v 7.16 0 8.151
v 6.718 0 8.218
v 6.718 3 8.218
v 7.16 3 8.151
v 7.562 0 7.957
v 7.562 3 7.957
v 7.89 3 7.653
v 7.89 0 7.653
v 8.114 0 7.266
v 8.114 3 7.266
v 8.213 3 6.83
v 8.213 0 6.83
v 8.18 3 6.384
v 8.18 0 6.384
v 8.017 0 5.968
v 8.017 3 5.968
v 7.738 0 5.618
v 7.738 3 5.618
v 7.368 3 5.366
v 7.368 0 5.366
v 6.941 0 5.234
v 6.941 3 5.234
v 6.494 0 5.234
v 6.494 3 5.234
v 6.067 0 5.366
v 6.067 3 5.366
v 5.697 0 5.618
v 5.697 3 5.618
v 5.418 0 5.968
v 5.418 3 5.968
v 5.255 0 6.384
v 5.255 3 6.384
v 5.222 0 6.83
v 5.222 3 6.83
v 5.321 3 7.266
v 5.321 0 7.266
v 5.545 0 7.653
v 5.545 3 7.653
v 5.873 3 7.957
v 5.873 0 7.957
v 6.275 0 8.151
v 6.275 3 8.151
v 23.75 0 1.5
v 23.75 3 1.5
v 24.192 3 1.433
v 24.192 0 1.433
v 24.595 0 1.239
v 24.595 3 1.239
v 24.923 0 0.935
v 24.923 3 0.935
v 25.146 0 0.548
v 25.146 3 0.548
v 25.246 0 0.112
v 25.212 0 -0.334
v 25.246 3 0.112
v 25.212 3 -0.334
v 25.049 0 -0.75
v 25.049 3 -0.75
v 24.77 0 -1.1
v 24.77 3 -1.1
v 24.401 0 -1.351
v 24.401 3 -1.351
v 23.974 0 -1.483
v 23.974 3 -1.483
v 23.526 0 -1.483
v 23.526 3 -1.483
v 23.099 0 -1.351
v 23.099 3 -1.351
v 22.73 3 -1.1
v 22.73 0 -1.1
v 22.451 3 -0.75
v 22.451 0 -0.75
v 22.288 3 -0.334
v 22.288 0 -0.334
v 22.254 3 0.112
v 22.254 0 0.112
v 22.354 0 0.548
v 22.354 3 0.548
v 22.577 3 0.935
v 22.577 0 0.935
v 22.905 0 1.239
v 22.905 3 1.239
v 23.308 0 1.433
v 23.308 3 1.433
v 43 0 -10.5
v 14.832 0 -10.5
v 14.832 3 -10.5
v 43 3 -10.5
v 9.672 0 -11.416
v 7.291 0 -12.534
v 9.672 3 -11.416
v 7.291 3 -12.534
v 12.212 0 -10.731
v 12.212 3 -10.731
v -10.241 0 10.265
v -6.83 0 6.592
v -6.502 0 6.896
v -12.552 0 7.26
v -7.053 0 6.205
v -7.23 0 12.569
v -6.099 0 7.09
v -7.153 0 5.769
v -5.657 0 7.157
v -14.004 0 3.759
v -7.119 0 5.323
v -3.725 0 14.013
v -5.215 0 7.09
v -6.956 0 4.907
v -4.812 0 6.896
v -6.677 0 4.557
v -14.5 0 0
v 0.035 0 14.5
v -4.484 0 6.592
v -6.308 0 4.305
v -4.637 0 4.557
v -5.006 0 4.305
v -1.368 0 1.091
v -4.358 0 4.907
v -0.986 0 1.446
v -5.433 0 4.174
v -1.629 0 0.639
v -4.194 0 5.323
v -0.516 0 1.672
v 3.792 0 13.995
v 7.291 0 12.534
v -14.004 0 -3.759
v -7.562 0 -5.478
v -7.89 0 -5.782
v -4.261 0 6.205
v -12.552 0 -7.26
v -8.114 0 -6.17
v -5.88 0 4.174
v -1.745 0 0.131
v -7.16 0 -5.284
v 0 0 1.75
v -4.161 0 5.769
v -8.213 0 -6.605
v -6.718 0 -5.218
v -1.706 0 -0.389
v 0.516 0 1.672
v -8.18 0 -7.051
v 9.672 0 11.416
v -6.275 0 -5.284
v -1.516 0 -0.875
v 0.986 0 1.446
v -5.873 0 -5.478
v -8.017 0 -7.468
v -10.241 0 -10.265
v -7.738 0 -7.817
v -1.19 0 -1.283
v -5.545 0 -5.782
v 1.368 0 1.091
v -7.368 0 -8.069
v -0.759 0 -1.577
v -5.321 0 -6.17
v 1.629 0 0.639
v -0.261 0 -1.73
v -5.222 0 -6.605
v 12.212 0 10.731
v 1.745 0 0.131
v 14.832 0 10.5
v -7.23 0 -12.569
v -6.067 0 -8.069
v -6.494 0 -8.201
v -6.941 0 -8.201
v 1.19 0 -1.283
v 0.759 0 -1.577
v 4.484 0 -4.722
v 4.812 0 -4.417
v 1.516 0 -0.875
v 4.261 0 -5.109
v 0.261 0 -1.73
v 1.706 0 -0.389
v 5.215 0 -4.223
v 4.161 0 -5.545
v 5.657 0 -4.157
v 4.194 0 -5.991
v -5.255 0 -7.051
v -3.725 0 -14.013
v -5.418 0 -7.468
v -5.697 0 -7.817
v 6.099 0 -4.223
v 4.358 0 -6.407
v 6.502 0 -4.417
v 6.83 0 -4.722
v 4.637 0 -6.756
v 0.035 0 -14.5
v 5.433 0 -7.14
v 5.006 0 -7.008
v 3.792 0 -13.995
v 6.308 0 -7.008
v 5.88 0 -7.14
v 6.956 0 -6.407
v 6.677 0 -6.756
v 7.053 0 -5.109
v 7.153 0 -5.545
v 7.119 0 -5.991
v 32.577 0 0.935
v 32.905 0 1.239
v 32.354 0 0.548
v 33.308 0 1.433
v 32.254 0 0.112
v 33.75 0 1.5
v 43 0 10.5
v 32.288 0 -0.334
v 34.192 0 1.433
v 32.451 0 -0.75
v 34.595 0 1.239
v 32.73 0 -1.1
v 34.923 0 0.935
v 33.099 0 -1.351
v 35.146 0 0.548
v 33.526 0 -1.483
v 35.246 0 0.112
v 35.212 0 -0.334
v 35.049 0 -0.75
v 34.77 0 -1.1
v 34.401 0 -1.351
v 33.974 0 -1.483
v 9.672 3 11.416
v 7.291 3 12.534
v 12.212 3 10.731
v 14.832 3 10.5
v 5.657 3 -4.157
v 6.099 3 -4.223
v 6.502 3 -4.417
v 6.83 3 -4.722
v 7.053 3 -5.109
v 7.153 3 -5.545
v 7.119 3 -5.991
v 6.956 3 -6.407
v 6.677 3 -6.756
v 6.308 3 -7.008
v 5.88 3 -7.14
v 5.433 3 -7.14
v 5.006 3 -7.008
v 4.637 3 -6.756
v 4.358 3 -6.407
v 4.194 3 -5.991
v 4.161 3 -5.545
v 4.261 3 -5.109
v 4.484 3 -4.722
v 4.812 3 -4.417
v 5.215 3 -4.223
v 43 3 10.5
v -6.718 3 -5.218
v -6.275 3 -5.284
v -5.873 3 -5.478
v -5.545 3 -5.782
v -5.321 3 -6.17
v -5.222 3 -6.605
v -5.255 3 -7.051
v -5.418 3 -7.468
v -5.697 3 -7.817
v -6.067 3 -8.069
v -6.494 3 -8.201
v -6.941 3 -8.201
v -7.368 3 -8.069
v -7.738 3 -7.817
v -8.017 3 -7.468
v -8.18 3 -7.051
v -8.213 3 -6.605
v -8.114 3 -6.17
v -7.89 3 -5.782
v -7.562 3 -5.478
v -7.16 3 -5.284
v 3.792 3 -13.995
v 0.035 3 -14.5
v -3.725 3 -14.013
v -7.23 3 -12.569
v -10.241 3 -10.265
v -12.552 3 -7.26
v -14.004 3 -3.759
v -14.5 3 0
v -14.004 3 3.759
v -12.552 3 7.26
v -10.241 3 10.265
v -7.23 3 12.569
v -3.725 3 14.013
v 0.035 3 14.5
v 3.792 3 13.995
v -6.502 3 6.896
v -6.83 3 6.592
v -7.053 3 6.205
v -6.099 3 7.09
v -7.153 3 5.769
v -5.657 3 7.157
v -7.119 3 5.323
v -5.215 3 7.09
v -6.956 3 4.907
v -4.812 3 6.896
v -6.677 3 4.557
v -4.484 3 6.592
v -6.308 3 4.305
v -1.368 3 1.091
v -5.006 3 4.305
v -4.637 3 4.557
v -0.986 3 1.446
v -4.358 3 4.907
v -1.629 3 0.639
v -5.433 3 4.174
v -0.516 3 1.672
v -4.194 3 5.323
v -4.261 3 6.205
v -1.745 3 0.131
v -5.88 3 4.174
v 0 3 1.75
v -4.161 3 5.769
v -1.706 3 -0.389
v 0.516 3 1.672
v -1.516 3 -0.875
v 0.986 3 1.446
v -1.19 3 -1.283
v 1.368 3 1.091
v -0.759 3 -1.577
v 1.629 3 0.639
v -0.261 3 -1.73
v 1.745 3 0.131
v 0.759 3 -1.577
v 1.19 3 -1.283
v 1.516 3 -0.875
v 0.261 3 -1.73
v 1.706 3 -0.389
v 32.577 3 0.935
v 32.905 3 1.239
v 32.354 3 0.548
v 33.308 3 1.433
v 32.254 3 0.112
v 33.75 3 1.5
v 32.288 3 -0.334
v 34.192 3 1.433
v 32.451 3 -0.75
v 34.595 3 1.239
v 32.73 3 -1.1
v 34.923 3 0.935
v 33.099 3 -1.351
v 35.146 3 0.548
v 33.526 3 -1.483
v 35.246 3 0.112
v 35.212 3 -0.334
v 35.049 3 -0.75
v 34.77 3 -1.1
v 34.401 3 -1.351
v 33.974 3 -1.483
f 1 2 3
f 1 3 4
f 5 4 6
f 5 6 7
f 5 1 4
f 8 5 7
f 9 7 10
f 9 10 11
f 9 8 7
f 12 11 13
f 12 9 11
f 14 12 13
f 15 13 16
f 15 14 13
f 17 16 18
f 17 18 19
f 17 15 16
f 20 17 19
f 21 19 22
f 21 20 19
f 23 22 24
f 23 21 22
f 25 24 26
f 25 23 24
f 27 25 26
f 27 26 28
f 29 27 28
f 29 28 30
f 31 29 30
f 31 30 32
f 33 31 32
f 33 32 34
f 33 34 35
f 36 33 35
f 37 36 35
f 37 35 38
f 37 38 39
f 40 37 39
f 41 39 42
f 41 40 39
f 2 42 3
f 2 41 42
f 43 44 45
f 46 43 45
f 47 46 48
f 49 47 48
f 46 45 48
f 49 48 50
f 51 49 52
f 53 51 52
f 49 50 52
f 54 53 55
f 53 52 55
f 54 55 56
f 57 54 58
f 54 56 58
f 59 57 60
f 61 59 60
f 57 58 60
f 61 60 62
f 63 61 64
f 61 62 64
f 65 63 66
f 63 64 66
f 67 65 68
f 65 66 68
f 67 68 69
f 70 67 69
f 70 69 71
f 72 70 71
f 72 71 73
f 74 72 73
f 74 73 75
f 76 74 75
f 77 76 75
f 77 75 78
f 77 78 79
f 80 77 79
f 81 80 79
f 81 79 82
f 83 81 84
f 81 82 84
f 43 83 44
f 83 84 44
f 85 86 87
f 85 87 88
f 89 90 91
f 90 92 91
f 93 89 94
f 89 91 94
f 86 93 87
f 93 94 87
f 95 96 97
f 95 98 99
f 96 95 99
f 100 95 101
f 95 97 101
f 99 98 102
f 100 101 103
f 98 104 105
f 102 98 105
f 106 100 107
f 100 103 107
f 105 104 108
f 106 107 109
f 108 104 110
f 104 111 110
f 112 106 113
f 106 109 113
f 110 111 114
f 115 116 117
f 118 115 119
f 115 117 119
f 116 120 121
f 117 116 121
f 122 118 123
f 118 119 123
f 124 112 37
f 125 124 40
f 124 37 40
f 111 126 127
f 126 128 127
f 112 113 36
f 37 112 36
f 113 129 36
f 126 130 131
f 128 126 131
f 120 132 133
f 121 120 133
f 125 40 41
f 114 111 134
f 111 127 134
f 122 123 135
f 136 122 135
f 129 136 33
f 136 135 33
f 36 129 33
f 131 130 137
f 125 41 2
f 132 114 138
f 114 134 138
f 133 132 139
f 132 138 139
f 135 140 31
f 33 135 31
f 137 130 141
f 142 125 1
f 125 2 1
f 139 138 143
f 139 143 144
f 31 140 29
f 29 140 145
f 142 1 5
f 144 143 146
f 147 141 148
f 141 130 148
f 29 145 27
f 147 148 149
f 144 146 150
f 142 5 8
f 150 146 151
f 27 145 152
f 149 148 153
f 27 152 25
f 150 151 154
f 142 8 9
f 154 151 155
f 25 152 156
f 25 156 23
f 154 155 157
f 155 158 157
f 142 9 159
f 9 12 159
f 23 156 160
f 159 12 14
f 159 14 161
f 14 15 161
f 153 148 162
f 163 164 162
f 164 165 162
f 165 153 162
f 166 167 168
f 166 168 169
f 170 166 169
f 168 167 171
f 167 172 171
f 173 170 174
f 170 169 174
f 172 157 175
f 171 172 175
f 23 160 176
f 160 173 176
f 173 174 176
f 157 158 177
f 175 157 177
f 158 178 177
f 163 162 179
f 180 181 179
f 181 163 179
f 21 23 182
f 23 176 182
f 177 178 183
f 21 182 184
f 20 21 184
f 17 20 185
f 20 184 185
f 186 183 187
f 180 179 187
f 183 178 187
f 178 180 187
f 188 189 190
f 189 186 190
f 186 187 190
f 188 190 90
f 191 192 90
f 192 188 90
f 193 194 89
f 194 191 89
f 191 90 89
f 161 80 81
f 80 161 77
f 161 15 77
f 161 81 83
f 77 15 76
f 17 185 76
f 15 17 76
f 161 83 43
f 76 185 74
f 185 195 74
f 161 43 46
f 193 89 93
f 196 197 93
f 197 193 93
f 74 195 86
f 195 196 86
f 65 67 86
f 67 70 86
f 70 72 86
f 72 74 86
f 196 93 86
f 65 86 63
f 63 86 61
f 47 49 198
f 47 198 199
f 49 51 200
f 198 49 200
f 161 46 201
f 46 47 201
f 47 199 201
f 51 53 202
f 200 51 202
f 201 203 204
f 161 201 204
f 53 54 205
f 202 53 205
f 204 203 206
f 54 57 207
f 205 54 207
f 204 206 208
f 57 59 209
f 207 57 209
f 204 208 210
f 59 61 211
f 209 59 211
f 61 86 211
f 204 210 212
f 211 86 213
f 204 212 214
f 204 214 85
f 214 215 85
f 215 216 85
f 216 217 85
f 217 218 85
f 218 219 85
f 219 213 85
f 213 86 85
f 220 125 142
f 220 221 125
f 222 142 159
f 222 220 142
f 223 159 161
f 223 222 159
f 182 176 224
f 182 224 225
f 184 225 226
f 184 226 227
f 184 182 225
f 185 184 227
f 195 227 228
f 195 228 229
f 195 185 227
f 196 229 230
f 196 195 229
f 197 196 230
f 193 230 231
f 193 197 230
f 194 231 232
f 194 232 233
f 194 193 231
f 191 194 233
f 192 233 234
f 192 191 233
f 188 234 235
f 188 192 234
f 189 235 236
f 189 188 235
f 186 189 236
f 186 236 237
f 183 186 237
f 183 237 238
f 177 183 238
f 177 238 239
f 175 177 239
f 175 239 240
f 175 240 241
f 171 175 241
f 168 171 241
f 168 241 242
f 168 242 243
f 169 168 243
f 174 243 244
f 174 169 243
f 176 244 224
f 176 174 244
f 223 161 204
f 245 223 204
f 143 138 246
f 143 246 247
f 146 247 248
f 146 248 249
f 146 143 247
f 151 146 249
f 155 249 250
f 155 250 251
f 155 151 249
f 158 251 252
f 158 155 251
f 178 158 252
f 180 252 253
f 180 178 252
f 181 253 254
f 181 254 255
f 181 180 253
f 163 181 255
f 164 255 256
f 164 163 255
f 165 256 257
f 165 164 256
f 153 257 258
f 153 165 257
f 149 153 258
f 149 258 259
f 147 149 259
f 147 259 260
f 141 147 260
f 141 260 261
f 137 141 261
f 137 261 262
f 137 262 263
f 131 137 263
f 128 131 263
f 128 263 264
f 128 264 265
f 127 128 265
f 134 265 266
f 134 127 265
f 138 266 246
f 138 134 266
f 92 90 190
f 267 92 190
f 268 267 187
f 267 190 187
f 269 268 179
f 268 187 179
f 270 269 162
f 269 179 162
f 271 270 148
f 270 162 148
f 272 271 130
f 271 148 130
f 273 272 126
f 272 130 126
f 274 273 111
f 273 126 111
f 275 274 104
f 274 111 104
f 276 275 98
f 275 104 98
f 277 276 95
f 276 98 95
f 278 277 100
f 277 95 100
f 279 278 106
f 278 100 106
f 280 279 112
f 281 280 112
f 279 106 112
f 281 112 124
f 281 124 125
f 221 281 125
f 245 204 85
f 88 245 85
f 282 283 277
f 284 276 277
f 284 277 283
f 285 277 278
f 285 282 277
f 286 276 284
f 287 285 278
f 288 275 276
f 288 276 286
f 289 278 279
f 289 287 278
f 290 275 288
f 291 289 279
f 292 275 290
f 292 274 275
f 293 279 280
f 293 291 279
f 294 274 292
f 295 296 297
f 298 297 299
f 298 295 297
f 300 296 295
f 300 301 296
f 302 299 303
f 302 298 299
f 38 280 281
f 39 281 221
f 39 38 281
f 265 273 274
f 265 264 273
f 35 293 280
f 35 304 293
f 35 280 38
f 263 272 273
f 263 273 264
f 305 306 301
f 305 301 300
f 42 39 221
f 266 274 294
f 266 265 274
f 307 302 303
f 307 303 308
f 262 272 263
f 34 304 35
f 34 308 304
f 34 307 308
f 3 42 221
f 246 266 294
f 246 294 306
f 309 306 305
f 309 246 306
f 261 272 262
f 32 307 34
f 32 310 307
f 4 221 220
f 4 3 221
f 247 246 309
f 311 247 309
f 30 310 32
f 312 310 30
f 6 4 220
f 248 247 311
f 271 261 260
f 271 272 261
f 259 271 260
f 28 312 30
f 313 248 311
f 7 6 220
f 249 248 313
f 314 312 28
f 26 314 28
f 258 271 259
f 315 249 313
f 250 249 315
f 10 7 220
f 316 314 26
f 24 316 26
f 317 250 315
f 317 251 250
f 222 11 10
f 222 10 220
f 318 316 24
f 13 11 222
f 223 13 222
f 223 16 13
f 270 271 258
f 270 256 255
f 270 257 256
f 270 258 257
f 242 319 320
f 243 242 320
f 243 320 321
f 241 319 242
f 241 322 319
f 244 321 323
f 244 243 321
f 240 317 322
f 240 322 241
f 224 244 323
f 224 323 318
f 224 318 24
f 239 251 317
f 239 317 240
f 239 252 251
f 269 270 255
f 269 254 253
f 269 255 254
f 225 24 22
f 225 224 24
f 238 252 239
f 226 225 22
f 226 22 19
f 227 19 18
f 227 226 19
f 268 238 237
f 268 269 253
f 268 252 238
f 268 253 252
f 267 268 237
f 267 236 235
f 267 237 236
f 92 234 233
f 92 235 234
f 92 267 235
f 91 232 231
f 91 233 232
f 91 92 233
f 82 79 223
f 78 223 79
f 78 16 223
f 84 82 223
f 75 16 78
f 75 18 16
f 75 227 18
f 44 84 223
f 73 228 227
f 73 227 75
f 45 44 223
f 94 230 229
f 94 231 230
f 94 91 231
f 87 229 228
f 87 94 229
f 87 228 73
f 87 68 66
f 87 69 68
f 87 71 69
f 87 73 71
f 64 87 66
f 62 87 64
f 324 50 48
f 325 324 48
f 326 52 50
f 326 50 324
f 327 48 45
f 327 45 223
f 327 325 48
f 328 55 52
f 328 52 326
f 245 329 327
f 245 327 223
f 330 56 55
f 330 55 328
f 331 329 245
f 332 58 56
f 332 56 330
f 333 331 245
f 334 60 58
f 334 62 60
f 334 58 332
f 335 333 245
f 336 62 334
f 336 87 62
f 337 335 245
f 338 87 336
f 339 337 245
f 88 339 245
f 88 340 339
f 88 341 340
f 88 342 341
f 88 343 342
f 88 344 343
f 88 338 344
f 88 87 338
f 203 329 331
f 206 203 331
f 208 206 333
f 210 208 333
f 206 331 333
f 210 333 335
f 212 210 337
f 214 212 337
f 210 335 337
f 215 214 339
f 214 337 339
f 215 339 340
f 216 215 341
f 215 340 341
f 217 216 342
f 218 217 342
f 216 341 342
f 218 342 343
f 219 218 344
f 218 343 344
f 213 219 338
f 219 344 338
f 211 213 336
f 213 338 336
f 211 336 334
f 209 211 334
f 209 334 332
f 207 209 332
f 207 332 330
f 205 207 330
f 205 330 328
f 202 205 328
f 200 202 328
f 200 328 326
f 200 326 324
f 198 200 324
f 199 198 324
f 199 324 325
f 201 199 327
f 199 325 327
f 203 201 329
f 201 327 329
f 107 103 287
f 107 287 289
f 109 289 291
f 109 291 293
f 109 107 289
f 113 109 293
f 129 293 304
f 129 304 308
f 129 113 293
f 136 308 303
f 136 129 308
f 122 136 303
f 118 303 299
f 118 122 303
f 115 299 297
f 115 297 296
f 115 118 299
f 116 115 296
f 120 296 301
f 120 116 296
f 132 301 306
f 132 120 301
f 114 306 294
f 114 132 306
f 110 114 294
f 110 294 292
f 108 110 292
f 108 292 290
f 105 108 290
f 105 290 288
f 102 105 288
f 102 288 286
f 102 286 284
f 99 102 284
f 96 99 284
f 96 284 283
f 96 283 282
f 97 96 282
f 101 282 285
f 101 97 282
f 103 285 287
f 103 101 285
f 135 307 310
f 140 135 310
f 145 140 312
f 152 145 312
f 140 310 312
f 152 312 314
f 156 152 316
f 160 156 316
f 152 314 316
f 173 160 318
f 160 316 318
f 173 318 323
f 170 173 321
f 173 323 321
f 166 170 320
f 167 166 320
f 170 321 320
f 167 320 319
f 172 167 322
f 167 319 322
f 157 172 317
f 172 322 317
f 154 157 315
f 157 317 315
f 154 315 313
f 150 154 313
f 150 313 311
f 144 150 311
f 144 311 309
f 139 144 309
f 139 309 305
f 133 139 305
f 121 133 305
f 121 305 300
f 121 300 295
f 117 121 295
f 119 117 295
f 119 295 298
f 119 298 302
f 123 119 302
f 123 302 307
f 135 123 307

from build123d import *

# Parameters (mm, degrees)
SKETCH1_R           = 14.5
SKETCH1_R_2         = 1.5
SKETCH1_W           = 33
SKETCH1_H           = 21
BOSS_EXTRUDE1_DEPTH = 3
FILLET1_R           = 15
SKETCH2_R           = 1.5
CUT_EXTRUDE1_DEPTH  = 3
SKETCH4_R           = 1.75
CUT_EXTRUDE2_DEPTH  = 10


with BuildPart() as part:
    # Sketch1 → Boss-Extrude1 (new body)
    # profile 1 of 2: a face of its own
    with BuildSketch(Plane(origin=(0, 0, 0), x_dir=(1, 0, 0), z_dir=(0, 1, 0))):
        Circle(SKETCH1_R)
        with Locations(Location((-6.717514421, 6.717514421, 0), (0, 0, 270))):
            Circle(SKETCH1_R_2, mode=Mode.SUBTRACT)
        with Locations(Location((5.656854249, 5.656854249, 0), (0, 0, 270))):
            Circle(SKETCH1_R_2, mode=Mode.SUBTRACT)
        with Locations(Location((-5.656854249, -5.656854249, 0), (0, 0, 270))):
            Circle(SKETCH1_R_2, mode=Mode.SUBTRACT)
        with Locations(Location((6.717514421, -6.717514421, 0), (0, 0, 270))):
            Circle(SKETCH1_R_2, mode=Mode.SUBTRACT)
    # profile 2 of 2: a face of its own
    with BuildSketch(Plane(origin=(0, 0, 0), x_dir=(1, 0, 0), z_dir=(0, 1, 0))):
        with Locations((26.5, 0)):
            Rectangle(SKETCH1_W, SKETCH1_H)
    extrude(amount=BOSS_EXTRUDE1_DEPTH)

    # Fillet1
    fillet1_edges = [part.edges().sort_by_distance(p)[0] for p in [
        (10, 1.5, -10.5),
        (10, 1.5, 10.5),
    ]]
    fillet(fillet1_edges, radius=FILLET1_R)

    # Sketch2 → Cut-Extrude1 (cut)
    with BuildSketch(Plane(origin=(0, 3, 0), x_dir=(1, 0, 0), z_dir=(0, 1, 0))):
        with Locations(Location((23.75, 0, 0), (0, 0, 270))):
            Circle(SKETCH2_R)
        with Locations(Location((33.75, 0, 0), (0, 0, 270))):
            Circle(SKETCH2_R)
    extrude(amount=-CUT_EXTRUDE1_DEPTH, mode=Mode.SUBTRACT)

    # Sketch4 → Cut-Extrude2 (cut)
    with BuildSketch(Plane(origin=(0, 3, 0), x_dir=(1, 0, 0), z_dir=(0, 1, 0))):
        with Locations(Location((0, 0, 0), (0, 0, 270))):
            Circle(SKETCH4_R)
    extrude(amount=-CUT_EXTRUDE2_DEPTH, mode=Mode.SUBTRACT)


solid = part.part
